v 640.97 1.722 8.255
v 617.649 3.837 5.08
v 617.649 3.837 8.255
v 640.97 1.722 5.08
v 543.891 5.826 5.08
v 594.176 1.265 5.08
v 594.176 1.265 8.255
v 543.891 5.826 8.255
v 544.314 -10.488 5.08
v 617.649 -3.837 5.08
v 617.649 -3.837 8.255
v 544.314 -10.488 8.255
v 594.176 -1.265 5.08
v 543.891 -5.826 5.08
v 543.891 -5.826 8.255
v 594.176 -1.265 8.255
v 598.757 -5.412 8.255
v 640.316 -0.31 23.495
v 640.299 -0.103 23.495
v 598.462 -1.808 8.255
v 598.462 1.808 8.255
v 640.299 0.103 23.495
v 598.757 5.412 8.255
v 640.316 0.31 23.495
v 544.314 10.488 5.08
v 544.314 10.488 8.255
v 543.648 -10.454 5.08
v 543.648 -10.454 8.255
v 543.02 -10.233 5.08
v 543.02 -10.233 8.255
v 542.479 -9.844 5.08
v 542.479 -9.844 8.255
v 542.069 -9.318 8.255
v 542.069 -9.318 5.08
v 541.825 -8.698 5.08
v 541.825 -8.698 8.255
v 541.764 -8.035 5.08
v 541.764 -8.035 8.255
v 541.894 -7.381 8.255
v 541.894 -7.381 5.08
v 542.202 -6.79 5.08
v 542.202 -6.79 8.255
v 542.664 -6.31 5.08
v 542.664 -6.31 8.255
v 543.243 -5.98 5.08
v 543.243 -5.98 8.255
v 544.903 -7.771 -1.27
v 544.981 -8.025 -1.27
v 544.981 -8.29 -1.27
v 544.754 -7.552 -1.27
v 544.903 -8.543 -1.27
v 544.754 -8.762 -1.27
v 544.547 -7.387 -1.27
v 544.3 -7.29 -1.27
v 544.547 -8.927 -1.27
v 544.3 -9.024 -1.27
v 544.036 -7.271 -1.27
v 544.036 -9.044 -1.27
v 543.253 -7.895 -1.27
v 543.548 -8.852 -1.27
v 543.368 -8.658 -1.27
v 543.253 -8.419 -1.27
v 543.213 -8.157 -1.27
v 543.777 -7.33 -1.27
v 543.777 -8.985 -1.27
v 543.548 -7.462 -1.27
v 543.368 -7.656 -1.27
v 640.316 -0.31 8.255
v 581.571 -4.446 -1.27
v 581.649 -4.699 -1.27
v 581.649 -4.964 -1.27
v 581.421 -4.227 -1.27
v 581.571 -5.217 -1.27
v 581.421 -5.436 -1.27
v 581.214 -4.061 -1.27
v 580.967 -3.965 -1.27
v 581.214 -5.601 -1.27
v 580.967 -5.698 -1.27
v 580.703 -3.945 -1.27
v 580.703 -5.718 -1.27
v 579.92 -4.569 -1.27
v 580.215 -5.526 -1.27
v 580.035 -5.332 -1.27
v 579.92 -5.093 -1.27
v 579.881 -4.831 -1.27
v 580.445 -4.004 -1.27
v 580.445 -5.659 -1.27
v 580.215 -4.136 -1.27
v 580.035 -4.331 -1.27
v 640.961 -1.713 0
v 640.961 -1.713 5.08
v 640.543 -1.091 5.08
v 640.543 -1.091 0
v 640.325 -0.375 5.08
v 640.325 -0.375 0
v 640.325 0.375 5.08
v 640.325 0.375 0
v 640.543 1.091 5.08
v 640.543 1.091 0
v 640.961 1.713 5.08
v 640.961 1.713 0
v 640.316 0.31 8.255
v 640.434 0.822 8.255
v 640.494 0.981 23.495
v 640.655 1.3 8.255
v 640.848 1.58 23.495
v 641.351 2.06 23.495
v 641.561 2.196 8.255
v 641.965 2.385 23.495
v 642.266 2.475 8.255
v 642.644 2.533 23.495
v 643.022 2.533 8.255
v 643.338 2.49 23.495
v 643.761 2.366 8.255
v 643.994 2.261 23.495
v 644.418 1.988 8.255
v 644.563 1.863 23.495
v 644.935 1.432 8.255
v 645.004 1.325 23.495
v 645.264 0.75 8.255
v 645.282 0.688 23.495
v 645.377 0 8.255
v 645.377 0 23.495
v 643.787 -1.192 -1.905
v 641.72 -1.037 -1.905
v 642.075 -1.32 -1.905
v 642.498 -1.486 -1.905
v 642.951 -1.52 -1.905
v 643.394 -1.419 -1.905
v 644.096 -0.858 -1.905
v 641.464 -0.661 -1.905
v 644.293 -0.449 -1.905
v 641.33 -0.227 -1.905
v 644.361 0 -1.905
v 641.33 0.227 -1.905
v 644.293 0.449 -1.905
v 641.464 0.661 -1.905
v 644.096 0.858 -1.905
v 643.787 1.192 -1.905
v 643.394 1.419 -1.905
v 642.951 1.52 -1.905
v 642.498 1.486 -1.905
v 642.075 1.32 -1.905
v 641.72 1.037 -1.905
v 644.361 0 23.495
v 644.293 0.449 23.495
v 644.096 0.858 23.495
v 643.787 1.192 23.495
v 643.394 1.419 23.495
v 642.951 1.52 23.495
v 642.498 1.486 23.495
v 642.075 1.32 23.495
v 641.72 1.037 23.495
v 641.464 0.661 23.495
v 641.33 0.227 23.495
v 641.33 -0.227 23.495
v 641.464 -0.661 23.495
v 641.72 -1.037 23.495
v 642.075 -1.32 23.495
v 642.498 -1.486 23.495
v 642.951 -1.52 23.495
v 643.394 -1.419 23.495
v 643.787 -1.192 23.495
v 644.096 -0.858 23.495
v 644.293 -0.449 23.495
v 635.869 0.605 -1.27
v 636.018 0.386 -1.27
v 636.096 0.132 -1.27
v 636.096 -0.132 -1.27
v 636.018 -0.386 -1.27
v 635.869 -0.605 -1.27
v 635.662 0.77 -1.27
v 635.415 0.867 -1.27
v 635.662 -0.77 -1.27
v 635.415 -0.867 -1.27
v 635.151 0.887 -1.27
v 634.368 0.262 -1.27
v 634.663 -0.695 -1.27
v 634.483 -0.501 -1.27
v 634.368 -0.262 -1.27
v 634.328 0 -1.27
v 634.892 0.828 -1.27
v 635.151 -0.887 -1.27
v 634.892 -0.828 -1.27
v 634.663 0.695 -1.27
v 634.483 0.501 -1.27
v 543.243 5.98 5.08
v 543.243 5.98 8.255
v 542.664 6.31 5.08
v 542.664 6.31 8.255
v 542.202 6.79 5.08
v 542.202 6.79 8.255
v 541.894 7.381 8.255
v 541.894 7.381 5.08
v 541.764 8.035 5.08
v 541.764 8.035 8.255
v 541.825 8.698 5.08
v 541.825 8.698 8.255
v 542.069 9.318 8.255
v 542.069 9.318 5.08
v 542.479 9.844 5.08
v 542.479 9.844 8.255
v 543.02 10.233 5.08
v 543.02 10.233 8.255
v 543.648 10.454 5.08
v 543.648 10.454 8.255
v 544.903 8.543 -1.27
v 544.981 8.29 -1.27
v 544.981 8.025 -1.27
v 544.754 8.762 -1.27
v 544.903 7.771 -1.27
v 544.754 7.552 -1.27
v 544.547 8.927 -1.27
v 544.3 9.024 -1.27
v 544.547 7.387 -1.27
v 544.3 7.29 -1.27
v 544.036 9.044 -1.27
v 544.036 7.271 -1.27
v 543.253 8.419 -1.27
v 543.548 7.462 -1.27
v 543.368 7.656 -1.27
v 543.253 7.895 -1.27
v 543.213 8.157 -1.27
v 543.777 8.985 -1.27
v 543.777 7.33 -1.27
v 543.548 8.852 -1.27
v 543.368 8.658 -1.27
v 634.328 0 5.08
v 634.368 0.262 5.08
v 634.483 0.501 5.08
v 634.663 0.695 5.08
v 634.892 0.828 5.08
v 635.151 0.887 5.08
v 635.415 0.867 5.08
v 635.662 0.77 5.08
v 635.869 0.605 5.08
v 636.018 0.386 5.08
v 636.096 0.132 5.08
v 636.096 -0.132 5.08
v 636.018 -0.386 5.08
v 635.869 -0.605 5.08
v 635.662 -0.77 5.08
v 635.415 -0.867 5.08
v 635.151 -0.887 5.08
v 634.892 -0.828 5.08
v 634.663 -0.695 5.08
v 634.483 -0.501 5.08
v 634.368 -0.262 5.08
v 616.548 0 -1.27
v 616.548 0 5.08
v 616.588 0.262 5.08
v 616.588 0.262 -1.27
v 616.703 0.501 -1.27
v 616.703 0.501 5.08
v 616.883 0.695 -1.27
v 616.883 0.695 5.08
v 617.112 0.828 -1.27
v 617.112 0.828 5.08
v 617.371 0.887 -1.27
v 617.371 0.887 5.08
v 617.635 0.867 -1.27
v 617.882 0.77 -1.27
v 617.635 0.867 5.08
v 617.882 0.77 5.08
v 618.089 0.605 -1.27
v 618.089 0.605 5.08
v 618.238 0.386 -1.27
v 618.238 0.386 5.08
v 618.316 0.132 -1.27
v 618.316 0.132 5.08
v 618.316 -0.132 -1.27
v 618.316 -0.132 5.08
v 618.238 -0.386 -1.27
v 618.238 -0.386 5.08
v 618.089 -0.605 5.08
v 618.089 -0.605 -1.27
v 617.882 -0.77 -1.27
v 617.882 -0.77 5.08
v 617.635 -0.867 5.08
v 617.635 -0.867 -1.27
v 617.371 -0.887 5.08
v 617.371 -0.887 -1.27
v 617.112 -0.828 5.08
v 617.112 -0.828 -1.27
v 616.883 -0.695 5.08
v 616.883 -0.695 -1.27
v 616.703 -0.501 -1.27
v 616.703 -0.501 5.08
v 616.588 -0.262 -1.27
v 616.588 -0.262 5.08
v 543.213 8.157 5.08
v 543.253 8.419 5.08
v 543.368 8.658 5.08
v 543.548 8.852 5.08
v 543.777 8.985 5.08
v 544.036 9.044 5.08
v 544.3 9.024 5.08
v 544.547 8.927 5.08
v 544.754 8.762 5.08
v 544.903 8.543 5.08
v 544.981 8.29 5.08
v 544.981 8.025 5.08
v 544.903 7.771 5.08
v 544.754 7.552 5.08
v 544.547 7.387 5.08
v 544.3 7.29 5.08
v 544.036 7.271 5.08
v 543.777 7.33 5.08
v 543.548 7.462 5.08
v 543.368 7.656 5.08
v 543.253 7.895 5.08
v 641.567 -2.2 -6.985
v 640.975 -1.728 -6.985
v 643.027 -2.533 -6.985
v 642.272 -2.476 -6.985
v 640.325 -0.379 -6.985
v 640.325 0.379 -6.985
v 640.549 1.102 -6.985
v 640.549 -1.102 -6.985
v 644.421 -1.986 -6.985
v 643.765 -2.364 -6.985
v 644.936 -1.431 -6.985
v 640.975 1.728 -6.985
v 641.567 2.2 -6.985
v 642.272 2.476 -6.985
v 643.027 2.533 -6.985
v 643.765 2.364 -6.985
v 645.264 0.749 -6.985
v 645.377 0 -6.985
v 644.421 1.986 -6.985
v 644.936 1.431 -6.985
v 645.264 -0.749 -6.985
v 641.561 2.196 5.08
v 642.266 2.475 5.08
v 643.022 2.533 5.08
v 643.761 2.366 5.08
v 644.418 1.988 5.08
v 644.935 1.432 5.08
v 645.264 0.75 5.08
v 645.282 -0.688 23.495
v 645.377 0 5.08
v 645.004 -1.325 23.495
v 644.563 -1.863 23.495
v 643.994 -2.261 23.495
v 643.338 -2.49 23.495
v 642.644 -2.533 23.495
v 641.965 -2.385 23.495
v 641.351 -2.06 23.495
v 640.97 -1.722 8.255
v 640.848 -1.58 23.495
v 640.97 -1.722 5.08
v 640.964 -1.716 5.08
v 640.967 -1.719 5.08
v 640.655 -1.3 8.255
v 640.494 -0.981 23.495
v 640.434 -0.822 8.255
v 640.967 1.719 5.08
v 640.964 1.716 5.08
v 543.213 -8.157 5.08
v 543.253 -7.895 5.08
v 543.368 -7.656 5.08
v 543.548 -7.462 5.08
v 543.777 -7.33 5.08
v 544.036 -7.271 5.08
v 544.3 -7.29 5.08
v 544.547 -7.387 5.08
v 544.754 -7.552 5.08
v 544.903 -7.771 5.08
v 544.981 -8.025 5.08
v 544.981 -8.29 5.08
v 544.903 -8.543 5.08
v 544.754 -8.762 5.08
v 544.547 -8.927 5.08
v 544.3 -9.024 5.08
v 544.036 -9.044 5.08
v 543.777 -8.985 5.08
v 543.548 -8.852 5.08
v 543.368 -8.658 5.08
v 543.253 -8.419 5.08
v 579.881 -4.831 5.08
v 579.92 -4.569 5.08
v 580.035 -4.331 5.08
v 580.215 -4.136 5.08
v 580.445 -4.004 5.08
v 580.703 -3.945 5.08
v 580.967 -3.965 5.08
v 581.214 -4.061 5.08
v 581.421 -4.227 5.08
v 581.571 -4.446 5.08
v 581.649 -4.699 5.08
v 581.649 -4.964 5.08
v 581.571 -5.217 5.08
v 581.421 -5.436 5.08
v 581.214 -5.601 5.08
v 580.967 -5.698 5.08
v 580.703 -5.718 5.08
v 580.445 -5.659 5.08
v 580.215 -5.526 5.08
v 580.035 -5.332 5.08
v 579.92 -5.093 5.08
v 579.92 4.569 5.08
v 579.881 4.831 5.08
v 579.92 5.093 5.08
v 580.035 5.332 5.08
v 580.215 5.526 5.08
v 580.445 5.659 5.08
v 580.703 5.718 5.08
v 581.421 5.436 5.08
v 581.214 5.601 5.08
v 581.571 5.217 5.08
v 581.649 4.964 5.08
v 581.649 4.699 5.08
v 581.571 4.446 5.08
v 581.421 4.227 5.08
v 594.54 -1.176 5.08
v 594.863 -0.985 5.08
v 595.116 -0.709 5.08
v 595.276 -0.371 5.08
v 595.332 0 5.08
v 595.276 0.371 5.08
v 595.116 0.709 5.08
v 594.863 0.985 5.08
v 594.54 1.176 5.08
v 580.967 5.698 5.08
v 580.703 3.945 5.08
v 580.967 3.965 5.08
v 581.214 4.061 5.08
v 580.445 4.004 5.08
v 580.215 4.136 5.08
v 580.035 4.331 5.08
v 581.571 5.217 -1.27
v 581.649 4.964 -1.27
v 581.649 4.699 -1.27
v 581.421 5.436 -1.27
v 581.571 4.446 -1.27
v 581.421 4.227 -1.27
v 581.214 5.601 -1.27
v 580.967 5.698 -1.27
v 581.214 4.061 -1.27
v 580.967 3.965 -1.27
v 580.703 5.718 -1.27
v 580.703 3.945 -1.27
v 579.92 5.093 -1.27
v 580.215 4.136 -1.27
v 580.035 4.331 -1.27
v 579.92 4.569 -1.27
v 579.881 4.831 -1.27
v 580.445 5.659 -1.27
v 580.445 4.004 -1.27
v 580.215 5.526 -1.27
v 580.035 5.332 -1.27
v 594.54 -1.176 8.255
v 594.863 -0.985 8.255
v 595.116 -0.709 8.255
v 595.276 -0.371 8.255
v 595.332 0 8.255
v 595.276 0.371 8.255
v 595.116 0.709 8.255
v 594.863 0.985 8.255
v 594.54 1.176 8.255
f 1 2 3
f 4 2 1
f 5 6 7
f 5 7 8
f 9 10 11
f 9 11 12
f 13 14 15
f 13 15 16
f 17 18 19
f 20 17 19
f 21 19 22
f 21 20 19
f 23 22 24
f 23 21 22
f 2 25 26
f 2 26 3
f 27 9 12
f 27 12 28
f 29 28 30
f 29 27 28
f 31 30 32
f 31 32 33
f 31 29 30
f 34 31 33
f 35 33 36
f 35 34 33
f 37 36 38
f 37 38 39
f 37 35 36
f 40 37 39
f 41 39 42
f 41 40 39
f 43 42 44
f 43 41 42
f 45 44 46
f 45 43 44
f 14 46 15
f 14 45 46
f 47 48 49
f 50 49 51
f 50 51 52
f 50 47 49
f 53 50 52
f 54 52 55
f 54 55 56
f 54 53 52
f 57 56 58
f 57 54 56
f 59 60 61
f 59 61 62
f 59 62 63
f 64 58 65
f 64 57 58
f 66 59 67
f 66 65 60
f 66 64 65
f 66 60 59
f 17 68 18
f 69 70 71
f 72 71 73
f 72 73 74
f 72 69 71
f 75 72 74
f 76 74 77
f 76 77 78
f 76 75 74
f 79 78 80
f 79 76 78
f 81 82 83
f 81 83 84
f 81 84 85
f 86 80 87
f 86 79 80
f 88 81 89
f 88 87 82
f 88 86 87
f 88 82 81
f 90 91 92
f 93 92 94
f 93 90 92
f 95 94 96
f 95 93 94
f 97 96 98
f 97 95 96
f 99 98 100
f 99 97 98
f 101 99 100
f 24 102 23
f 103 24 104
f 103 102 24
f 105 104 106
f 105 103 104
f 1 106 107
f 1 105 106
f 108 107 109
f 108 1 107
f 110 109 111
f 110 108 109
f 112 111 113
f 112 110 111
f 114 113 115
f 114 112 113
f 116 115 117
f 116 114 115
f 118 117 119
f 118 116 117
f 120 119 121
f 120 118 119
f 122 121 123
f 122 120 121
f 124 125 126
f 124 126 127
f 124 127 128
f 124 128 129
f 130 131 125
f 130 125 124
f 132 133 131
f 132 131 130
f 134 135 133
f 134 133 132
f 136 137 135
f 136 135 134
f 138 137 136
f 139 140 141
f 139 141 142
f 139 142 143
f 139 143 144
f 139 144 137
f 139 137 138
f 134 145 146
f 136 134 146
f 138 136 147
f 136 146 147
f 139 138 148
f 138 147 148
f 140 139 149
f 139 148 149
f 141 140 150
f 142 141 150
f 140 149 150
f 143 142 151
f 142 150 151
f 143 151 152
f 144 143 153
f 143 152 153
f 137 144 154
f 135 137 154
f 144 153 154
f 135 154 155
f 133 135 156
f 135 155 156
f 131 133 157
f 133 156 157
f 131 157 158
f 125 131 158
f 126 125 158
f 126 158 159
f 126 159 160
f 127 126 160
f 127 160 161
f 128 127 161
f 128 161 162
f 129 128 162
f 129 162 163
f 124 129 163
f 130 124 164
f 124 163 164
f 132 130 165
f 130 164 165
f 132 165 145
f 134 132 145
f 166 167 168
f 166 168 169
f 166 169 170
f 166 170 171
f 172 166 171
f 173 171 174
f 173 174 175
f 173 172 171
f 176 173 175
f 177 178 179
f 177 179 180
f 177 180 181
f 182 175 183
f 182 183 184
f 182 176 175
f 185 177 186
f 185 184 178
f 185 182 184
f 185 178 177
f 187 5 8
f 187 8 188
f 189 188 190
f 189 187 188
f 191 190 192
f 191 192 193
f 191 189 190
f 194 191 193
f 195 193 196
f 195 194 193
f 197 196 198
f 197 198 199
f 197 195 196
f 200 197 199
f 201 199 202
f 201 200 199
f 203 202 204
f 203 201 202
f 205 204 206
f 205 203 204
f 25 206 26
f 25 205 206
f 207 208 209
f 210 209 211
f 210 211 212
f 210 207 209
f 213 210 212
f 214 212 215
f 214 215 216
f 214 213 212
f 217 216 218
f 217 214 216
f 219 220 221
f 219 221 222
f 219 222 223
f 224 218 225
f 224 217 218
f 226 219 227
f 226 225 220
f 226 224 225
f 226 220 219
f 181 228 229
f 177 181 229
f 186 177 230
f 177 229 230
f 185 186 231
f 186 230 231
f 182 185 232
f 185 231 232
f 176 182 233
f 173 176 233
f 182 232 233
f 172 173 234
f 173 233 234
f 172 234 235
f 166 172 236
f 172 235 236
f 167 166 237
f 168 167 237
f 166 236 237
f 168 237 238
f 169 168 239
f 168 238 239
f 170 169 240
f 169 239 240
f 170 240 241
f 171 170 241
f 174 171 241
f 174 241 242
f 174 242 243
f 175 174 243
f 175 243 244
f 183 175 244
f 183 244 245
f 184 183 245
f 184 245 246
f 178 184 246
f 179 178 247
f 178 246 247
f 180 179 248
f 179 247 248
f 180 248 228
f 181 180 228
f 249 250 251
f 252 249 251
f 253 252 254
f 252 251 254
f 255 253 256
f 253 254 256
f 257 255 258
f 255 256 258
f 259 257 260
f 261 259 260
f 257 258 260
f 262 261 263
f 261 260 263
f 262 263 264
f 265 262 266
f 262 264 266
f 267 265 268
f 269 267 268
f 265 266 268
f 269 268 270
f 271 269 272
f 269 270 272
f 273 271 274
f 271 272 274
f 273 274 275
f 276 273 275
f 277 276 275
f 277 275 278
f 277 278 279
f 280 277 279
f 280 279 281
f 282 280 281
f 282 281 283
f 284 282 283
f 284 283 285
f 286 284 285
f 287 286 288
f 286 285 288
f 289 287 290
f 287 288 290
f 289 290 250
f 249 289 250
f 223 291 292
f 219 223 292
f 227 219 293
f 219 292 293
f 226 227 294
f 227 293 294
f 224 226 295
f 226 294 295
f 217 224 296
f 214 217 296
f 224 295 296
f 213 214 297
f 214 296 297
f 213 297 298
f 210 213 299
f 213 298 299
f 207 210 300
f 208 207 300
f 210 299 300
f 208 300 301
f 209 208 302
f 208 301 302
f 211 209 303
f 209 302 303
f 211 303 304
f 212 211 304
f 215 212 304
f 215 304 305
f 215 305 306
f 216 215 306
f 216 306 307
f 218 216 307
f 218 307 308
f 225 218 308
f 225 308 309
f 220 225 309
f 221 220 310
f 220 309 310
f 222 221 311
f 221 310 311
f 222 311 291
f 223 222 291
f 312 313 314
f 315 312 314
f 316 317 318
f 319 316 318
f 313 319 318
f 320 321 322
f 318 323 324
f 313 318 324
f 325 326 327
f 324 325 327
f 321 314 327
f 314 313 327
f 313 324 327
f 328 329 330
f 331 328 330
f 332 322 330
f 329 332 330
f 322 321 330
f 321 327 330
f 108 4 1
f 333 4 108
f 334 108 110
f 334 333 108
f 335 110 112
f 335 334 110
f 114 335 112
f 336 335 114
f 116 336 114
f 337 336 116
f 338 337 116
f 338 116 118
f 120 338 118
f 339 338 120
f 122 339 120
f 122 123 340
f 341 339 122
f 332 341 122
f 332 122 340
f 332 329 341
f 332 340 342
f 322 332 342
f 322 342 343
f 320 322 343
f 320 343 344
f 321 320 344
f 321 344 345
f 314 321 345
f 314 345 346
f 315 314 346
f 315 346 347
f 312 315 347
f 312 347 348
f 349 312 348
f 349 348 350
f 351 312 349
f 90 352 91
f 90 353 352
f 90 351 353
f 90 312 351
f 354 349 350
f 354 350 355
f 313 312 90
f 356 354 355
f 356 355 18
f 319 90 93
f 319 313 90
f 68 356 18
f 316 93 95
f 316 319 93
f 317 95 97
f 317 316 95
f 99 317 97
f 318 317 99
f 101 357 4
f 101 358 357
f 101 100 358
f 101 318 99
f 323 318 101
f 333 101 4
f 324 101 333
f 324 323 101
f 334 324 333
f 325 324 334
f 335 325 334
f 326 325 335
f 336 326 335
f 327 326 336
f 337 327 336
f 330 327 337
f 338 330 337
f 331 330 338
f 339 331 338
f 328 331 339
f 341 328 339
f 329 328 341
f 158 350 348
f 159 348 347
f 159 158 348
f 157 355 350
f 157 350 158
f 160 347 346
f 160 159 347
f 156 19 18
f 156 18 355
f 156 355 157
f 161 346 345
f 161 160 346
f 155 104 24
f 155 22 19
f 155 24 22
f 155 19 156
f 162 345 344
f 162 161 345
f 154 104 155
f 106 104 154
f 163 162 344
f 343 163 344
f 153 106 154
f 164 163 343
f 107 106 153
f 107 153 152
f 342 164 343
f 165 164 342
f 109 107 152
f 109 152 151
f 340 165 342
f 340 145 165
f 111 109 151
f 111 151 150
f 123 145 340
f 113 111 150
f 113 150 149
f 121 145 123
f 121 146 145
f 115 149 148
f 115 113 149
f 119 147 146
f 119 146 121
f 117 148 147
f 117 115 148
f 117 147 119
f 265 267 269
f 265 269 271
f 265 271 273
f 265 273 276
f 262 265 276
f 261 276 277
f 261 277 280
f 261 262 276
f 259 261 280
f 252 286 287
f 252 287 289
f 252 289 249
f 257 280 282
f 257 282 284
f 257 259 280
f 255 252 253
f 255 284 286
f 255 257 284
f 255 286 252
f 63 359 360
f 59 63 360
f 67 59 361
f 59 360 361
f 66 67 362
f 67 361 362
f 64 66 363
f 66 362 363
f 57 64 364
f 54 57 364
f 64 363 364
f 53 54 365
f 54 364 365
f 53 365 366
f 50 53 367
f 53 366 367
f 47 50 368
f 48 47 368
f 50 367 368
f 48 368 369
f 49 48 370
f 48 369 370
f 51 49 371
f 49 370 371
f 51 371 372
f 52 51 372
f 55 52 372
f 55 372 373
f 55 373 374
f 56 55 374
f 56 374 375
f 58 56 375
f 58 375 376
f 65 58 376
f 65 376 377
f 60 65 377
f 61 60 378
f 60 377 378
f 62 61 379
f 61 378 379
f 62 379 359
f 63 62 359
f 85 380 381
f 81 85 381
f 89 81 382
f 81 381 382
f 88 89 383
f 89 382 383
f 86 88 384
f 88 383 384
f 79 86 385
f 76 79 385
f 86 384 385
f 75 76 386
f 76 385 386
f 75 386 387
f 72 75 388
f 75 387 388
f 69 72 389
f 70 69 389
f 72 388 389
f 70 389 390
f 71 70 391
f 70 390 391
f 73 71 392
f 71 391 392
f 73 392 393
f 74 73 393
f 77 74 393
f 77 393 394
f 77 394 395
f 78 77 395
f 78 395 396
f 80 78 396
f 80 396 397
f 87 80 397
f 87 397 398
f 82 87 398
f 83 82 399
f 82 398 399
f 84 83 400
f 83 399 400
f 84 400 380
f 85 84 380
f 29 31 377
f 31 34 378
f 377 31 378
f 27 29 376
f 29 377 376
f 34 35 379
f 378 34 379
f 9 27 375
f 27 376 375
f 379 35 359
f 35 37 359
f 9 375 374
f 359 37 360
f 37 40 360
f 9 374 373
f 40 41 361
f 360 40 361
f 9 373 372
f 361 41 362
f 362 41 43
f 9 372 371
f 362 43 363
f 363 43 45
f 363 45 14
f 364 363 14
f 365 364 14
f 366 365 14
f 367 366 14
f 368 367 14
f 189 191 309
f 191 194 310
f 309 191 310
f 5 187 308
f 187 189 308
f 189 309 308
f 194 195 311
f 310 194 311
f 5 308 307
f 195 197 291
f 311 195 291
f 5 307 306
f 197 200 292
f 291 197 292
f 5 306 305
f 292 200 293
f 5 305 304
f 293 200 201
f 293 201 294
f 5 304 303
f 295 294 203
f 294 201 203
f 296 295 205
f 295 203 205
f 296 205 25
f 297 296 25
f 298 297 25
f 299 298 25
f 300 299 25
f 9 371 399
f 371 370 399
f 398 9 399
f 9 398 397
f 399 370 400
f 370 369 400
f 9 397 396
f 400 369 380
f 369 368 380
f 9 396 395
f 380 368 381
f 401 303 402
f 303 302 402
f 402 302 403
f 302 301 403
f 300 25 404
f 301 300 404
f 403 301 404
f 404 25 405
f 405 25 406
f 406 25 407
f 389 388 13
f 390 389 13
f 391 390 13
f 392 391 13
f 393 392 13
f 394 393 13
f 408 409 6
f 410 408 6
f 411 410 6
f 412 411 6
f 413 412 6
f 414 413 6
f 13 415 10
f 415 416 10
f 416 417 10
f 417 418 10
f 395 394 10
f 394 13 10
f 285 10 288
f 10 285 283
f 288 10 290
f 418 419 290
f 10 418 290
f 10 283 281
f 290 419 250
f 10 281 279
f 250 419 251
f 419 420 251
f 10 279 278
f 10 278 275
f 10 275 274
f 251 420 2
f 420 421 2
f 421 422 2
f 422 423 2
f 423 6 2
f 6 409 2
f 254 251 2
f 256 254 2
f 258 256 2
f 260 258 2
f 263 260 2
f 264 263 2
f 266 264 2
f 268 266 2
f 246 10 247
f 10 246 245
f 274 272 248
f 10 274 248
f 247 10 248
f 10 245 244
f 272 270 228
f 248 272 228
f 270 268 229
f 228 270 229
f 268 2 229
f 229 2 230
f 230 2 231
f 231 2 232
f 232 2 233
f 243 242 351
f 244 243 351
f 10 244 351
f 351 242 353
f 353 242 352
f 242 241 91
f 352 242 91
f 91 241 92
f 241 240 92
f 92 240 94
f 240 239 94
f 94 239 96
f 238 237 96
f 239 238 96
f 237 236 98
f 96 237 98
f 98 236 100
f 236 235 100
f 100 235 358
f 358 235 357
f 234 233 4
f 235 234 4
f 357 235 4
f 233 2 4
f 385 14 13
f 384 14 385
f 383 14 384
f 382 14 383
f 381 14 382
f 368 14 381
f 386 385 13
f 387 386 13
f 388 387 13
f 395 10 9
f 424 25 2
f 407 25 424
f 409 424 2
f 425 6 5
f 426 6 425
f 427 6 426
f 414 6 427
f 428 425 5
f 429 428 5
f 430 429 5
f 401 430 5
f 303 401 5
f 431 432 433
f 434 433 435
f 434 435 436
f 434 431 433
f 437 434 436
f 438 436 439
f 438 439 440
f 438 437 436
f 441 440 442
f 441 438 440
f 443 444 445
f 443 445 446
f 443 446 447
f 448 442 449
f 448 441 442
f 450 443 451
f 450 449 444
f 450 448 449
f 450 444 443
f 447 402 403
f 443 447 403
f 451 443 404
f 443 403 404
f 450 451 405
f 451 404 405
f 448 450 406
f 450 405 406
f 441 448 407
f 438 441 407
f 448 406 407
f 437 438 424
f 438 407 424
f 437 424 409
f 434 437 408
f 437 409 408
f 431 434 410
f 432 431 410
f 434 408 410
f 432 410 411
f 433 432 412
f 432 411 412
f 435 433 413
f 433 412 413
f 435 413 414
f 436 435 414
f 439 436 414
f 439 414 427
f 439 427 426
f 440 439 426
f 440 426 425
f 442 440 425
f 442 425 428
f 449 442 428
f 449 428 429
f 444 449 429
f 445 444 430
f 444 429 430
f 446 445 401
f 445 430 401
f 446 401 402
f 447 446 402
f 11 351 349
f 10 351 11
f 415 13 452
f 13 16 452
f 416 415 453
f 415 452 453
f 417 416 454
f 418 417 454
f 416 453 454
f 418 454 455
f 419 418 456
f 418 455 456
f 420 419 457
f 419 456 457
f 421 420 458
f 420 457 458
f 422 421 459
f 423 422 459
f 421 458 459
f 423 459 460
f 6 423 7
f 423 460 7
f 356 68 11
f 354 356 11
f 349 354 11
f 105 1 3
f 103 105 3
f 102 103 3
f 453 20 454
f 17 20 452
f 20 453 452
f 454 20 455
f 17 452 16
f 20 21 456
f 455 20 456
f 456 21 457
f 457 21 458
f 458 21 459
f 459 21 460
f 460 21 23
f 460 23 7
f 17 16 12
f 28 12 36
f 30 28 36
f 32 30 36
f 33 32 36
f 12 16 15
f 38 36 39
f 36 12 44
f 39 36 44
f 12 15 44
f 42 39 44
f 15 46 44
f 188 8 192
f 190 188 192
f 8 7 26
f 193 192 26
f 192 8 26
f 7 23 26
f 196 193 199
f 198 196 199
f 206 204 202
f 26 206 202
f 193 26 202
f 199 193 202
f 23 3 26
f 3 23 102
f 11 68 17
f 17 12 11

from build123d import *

# Parameters (mm, degrees)
BOSS_EXTRUDE1_DEPTH      = 5.08
CUT_EXTRUDE2_START       = -6.0800001
CUT_EXTRUDE2_DEPTH       = 7.0800002
BOSS_EXTRUDE2_DEPTH      = 3.175
SKETCH6_R                = 2.54
BOSS_EXTRUDE3_DEPTH      = 15.24
SKETCH7_R                = 1.524
CUT_EXTRUDE3_DEPTH       = 25.4
CUT_EXTRUDE4_DEPTH       = 5.08
SKETCH9_R                = 0.889
BOSS_EXTRUDE4_DEPTH      = 6.35
FILLET1_R                = 1.27
REVOLVE1_ANGLE           = 7
REVOLVE1_OTHER_WAY_ANGLE = 7


with BuildPart() as part:
    # Sketch2 → Boss-Extrude1 (new body)
    with BuildSketch(Plane.XY):
        with BuildLine():
            ThreePointArc((642.510849283, -1.582039112), (643.111845681, -1.408373102), (643.599082689, -1.016))
            ThreePointArc((643.599082689, -1.016), (642.269121423, -1.135922533), (641.567082689, 0))
            Line((641.567082689, 0), (473.360965279, 0))
            Line((473.360965279, 0), (460.660965279, 0))
            Line((460.660965279, 0), (114.935, 0))
            ThreePointArc((114.935, 0), (104.14, -10.795), (93.345, 0))
            Line((93.345, 0), (53.34, 0))
            ThreePointArc((53.34, 0), (40.64, -12.7), (27.94, 0))
            Line((27.94, 0), (0, 0))
            add(Edge.make_bspline(
                [(0, 0), (0, -1.007496172), (0.154611582, -3.513796615), (1.106333228, -7.923389435), (3.463136343, -13.420354421), (7.689616489, -19.513207632), (13.932423524, -25.726412106), (22.129107375, -31.731455339), (32.141645239, -37.332204029), (43.82045433, -42.41500246), (57.023709725, -46.912543066), (71.619696083, -50.784752003), (87.485018636, -54.008935199), (104.502313427, -56.574303932), (122.558104573, -58.481758104), (141.542033828, -59.739895824), (161.345829027, -60.366961324), (181.863132616, -60.387506142), (202.989192599, -59.8341217), (224.620860897, -58.745176641), (246.65655865, -57.164603829), (268.996310773, -55.141201012), (291.541767704, -52.727712704), (314.196207315, -49.979843895), (336.86454415, -46.955447457), (359.453314895, -43.713502532), (381.870662856, -40.313266856), (404.02631566, -36.813220545), (425.831595832, -33.270324121), (447.199424328, -29.739007432), (468.044367735, -26.27043606), (488.282710288, -22.911672601), (507.832591566, -19.705111663), (526.614143658, -16.687720753), (544.549749946, -13.890665375), (561.564270734, -11.338919625), (577.585454095, -9.050636147), (592.543922516, -7.037634907), (606.374988512, -5.304428983), (619.014124193, -3.849253664), (630.413817462, -2.663385493), (638.093728429, -1.953546407), (641.993392355, -1.625070631), (642.510849283, -1.582039112)],
                knots=[0.5, 0.5, 0.5, 0.5, 0.502166769, 0.505390167, 0.509655974, 0.514947682, 0.521244711, 0.528520886, 0.536744945, 0.54588136, 0.555890751, 0.566730119, 0.57835299, 0.590709588, 0.603747039, 0.617409572, 0.631638768, 0.646373793, 0.661551658, 0.677107483, 0.692974771, 0.709085713, 0.725371443, 0.741762353, 0.758188398, 0.774579367, 0.790865214, 0.806976332, 0.822843867, 0.838400002, 0.853578262, 0.868313774, 0.882543568, 0.896206835, 0.909245173, 0.92160287, 0.933227116, 0.944068236, 0.954079898, 0.963219316, 0.971447445, 0.978729112, 0.979842958, 0.979842958, 0.979842958, 0.979842958], degree=3))
        make_face()
    boss_extrude1 = extrude(amount=BOSS_EXTRUDE1_DEPTH)

    # Sketch3 → Cut-Extrude2 (cut)
    with BuildSketch(Plane.XY.offset(5.08).offset(CUT_EXTRUDE2_START)):
        with BuildLine():
            ThreePointArc((212.767950148, 0), (169.566475074, 43.201475074), (126.365, 0))
            Line((126.365, 0), (212.767950148, 0))
        make_face()
        with BuildLine():
            Line((212.767950148, 0), (126.365, 0))
            ThreePointArc((126.365, 0), (169.566475074, -43.201475074), (212.767950148, 0))
        make_face()
        with BuildLine():
            ThreePointArc((300.809151759, 0), (262.503550953, 38.305600806), (224.197950148, 0))
            Line((224.197950148, 0), (300.809151759, 0))
        make_face()
        with BuildLine():
            Line((300.809151759, 0), (224.197950148, 0))
            ThreePointArc((224.197950148, 0), (262.503550953, -38.305600806), (300.809151759, 0))
        make_face()
        with BuildLine():
            ThreePointArc((369.720663748, 0), (340.979907754, 28.740755995), (312.239151759, 0))
            Line((312.239151759, 0), (369.720663748, 0))
        make_face()
        with BuildLine():
            Line((369.720663748, 0), (312.239151759, 0))
            ThreePointArc((312.239151759, 0), (340.979907754, -28.740755995), (369.720663748, 0))
        make_face()
        with BuildLine():
            ThreePointArc((381.150663748, 0), (400.327663748, -19.177), (419.504663748, 0))
            Line((419.504663748, 0), (381.150663748, 0))
        make_face()
        with BuildLine():
            Line((381.150663748, 0), (419.504663748, 0))
            ThreePointArc((419.504663748, 0), (400.327663748, 19.177), (381.150663748, 0))
        make_face()
        with BuildLine():
            ThreePointArc((430.474866123, 0), (443.301866123, -12.827), (456.128866123, 0))
            Line((456.128866123, 0), (430.474866123, 0))
        make_face()
        with BuildLine():
            Line((430.474866123, 0), (456.128866123, 0))
            ThreePointArc((456.128866123, 0), (443.301866123, 12.827), (430.474866123, 0))
        make_face()
        with BuildLine():
            ThreePointArc((475.605534569, 0), (482.082534569, -6.477), (488.559534569, 0))
            Line((488.559534569, 0), (475.605534569, 0))
        make_face()
        with BuildLine():
            Line((475.605534569, 0), (488.559534569, 0))
            ThreePointArc((488.559534569, 0), (482.082534569, 6.477), (475.605534569, 0))
        make_face()
    cut_extrude2 = extrude(amount=CUT_EXTRUDE2_DEPTH, mode=Mode.SUBTRACT)

    # Mirror1: Boss-Extrude1, Cut-Extrude2 across plane
    add(boss_extrude1.mirror(Plane.ZX))
    add(cut_extrude2.mirror(Plane.ZX), mode=Mode.SUBTRACT)

    # Sketch5 → Boss-Extrude2 (add)
    with BuildSketch(Plane.XY.offset(5.08)):
        with BuildLine():
            Line((640.969745334, -1.721816251), (617.648537938, -3.837034781))
            Line((617.648537938, -3.837034781), (544.313686995, -10.488458656))
            ThreePointArc((544.313686995, -10.488458656), (541.770845349, -8.368527507), (543.890776497, -5.825685861))
            Line((543.890776497, -5.825685861), (608.121505485, 0))
            Line((608.121505485, 0), (543.890776497, 5.825685861))
            ThreePointArc((543.890776497, 5.825685861), (541.770845349, 8.368527507), (544.313686995, 10.488458656))
            Line((544.313686995, 10.488458656), (617.648537938, 3.837034781))
            Line((617.648537938, 3.837034781), (640.969745334, 1.721816251))
            ThreePointArc((640.969745334, 1.721816251), (645.377082689, 0), (640.969745334, -1.721816251))
        make_face()
    extrude(amount=BOSS_EXTRUDE2_DEPTH)

    # Sketch6 → Boss-Extrude3 (add, symmetric)
    with BuildSketch(Plane.XY.offset(8.255)):
        with Locations((642.837082689, 0)):
            Circle(SKETCH6_R)
    extrude(amount=BOSS_EXTRUDE3_DEPTH, both=True)

    # Sketch7 → Cut-Extrude3 (cut)
    with BuildSketch(Plane.XY.offset(23.495)):
        with Locations((642.837082689, 0)):
            Circle(SKETCH7_R)
    extrude(amount=-CUT_EXTRUDE3_DEPTH, mode=Mode.SUBTRACT)

    # Sketch8 → Cut-Extrude4 (cut)
    with BuildSketch(Plane(origin=(0, 0, 0), x_dir=(-1, 0, 0), z_dir=(0, 0, -1))):
        with BuildLine():
            ThreePointArc((-640.961258409, -1.712566282), (-640.297082689, 0), (-640.961258409, 1.712566282))
            add(Edge.make_bspline(
                [(-640.961258409, -1.712566282), (-640.960510251, -1.712630108), (-637.579890575, -2.001039431), (-630.413817462, -2.663385493), (-619.014124193, -3.849253664), (-606.374988512, -5.304428983), (-592.543922516, -7.037634907), (-577.585454095, -9.050636147), (-561.564270734, -11.338919625), (-544.549749946, -13.890665375), (-526.614143658, -16.687720753), (-507.832591566, -19.705111663), (-488.282710288, -22.911672601), (-468.044367735, -26.27043606), (-447.199424328, -29.739007432), (-425.831595832, -33.270324121), (-404.02631566, -36.813220545), (-381.870662856, -40.313266856), (-359.453314895, -43.713502532), (-336.86454415, -46.955447457), (-314.196207315, -49.979843895), (-291.541767704, -52.727712704), (-268.996310773, -55.141201012), (-246.65655865, -57.164603829), (-224.620860897, -58.745176641), (-202.989192599, -59.8341217), (-181.863132616, -60.387506142), (-161.345829027, -60.366961324), (-141.542033828, -59.739895824), (-122.558104573, -58.481758104), (-104.502313427, -56.574303932), (-87.485018636, -54.008935199), (-71.619696083, -50.784752003), (-57.023709725, -46.912543066), (-43.82045433, -42.41500246), (-32.141645239, -37.332204029), (-22.129107375, -31.731455339), (-13.932423524, -25.726412106), (-7.689616489, -19.513207632), (-3.463136343, -13.420354421), (-1.106333228, -7.923389435), (-0.154611582, -3.513796615), (0.062151598, 0), (-0.154611582, 3.513796615), (-1.106333228, 7.923389435), (-3.463136343, 13.420354421), (-7.689616489, 19.513207632), (-13.932423524, 25.726412106), (-22.129107375, 31.731455339), (-32.141645239, 37.332204029), (-43.82045433, 42.41500246), (-57.023709725, 46.912543066), (-71.619696083, 50.784752003), (-87.485018636, 54.008935199), (-104.502313427, 56.574303932), (-122.558104573, 58.481758104), (-141.542033828, 59.739895824), (-161.345829027, 60.366961324), (-181.863132616, 60.387506142), (-202.989192599, 59.8341217), (-224.620860897, 58.745176641), (-246.65655865, 57.164603829), (-268.996310773, 55.141201012), (-291.541767704, 52.727712704), (-314.196207315, 49.979843895), (-336.86454415, 46.955447457), (-359.453314895, 43.713502532), (-381.870662856, 40.313266856), (-404.02631566, 36.813220545), (-425.831595832, 33.270324121), (-447.199424328, 29.739007432), (-468.044367735, 26.27043606), (-488.282710288, 22.911672601), (-507.832591566, 19.705111663), (-526.614143658, 16.687720753), (-544.549749946, 13.890665375), (-561.564270734, 11.338919625), (-577.585454095, 9.050636147), (-592.543922516, 7.037634907), (-606.374988512, 5.304428983), (-619.014124193, 3.849253664), (-630.413817462, 2.663385493), (-637.579890575, 2.001039431), (-640.960510251, 1.712630108), (-640.961258409, 1.712566282)],
                knots=[0.021269276, 0.021269276, 0.021269276, 0.021269276, 0.021270888, 0.028552555, 0.036780684, 0.045920102, 0.055931764, 0.066772884, 0.07839713, 0.090754827, 0.103793165, 0.117456432, 0.131686226, 0.146421738, 0.161599998, 0.177156133, 0.193023668, 0.209134786, 0.225420633, 0.241811602, 0.258237647, 0.274628557, 0.290914287, 0.307025229, 0.322892517, 0.338448342, 0.353626207, 0.368361232, 0.382590428, 0.396252961, 0.409290412, 0.42164701, 0.433269881, 0.444109249, 0.45411864, 0.463255055, 0.471479114, 0.478755289, 0.485052318, 0.490344026, 0.494609833, 0.497833231, 0.5, 0.502166769, 0.505390167, 0.509655974, 0.514947682, 0.521244711, 0.528520886, 0.536744945, 0.54588136, 0.555890751, 0.566730119, 0.57835299, 0.590709588, 0.603747039, 0.617409572, 0.631638768, 0.646373793, 0.661551658, 0.677107483, 0.692974771, 0.709085713, 0.725371443, 0.741762353, 0.758188398, 0.774579367, 0.790865214, 0.806976332, 0.822843867, 0.838400002, 0.853578262, 0.868313774, 0.882543568, 0.896206835, 0.909245173, 0.92160287, 0.933227116, 0.944068236, 0.954079898, 0.963219316, 0.971447445, 0.978729112, 0.978730724, 0.978730724, 0.978730724, 0.978730724], degree=3))
        make_face()
    extrude(amount=-CUT_EXTRUDE4_DEPTH, mode=Mode.SUBTRACT)

    # Sketch9 → Boss-Extrude4 (add)
    with BuildSketch(Plane(origin=(0, 0, 5.08), x_dir=(-1, 0, 0), z_dir=(0, 0, -1))):
        with Locations((-544.102231746, 8.157072259)):
            Circle(SKETCH9_R)
        with Locations((-544.102231746, -8.157072259)):
            Circle(SKETCH9_R)
        with Locations((-580.769657218, 4.831360321)):
            Circle(SKETCH9_R)
        with Locations((-580.769657218, -4.831360321)):
            Circle(SKETCH9_R)
        with Locations((-617.437082689, 0)):
            Circle(SKETCH9_R)
        with Locations((-635.217082689, 0)):
            Circle(SKETCH9_R)
    extrude(amount=BOSS_EXTRUDE4_DEPTH)

    # Fillet1
    fillet1_edges = [part.edges().sort_by_distance(p)[0] for p in [
        (608.121505485, 0, 6.6675),
    ]]
    fillet(fillet1_edges, radius=FILLET1_R)

    # Sketch10 → Revolve1 (revolve)
    with BuildSketch(Plane(origin=(0, 0, 0), x_dir=(1, 0, 0), z_dir=(0, 1, 0))):
        Polygon((640.297082689, -23.495), (598.425526817, -8.255), (640.297082689, -8.255), align=None)
    revolve(axis=Axis((642.837082689, 0, -1.905), (0, 0, 1)), revolution_arc=REVOLVE1_ANGLE)

    # Sketch10 → Revolve1 other way (revolve)
    with BuildSketch(Plane(origin=(0, 0, 0), x_dir=(1, 0, 0), z_dir=(0, 1, 0))):
        Polygon((640.297082689, -23.495), (598.425526817, -8.255), (640.297082689, -8.255), align=None)
    revolve(axis=Axis((642.837082689, 0, -1.905), (0, 0, -1)), revolution_arc=REVOLVE1_OTHER_WAY_ANGLE)


solid = part.part
